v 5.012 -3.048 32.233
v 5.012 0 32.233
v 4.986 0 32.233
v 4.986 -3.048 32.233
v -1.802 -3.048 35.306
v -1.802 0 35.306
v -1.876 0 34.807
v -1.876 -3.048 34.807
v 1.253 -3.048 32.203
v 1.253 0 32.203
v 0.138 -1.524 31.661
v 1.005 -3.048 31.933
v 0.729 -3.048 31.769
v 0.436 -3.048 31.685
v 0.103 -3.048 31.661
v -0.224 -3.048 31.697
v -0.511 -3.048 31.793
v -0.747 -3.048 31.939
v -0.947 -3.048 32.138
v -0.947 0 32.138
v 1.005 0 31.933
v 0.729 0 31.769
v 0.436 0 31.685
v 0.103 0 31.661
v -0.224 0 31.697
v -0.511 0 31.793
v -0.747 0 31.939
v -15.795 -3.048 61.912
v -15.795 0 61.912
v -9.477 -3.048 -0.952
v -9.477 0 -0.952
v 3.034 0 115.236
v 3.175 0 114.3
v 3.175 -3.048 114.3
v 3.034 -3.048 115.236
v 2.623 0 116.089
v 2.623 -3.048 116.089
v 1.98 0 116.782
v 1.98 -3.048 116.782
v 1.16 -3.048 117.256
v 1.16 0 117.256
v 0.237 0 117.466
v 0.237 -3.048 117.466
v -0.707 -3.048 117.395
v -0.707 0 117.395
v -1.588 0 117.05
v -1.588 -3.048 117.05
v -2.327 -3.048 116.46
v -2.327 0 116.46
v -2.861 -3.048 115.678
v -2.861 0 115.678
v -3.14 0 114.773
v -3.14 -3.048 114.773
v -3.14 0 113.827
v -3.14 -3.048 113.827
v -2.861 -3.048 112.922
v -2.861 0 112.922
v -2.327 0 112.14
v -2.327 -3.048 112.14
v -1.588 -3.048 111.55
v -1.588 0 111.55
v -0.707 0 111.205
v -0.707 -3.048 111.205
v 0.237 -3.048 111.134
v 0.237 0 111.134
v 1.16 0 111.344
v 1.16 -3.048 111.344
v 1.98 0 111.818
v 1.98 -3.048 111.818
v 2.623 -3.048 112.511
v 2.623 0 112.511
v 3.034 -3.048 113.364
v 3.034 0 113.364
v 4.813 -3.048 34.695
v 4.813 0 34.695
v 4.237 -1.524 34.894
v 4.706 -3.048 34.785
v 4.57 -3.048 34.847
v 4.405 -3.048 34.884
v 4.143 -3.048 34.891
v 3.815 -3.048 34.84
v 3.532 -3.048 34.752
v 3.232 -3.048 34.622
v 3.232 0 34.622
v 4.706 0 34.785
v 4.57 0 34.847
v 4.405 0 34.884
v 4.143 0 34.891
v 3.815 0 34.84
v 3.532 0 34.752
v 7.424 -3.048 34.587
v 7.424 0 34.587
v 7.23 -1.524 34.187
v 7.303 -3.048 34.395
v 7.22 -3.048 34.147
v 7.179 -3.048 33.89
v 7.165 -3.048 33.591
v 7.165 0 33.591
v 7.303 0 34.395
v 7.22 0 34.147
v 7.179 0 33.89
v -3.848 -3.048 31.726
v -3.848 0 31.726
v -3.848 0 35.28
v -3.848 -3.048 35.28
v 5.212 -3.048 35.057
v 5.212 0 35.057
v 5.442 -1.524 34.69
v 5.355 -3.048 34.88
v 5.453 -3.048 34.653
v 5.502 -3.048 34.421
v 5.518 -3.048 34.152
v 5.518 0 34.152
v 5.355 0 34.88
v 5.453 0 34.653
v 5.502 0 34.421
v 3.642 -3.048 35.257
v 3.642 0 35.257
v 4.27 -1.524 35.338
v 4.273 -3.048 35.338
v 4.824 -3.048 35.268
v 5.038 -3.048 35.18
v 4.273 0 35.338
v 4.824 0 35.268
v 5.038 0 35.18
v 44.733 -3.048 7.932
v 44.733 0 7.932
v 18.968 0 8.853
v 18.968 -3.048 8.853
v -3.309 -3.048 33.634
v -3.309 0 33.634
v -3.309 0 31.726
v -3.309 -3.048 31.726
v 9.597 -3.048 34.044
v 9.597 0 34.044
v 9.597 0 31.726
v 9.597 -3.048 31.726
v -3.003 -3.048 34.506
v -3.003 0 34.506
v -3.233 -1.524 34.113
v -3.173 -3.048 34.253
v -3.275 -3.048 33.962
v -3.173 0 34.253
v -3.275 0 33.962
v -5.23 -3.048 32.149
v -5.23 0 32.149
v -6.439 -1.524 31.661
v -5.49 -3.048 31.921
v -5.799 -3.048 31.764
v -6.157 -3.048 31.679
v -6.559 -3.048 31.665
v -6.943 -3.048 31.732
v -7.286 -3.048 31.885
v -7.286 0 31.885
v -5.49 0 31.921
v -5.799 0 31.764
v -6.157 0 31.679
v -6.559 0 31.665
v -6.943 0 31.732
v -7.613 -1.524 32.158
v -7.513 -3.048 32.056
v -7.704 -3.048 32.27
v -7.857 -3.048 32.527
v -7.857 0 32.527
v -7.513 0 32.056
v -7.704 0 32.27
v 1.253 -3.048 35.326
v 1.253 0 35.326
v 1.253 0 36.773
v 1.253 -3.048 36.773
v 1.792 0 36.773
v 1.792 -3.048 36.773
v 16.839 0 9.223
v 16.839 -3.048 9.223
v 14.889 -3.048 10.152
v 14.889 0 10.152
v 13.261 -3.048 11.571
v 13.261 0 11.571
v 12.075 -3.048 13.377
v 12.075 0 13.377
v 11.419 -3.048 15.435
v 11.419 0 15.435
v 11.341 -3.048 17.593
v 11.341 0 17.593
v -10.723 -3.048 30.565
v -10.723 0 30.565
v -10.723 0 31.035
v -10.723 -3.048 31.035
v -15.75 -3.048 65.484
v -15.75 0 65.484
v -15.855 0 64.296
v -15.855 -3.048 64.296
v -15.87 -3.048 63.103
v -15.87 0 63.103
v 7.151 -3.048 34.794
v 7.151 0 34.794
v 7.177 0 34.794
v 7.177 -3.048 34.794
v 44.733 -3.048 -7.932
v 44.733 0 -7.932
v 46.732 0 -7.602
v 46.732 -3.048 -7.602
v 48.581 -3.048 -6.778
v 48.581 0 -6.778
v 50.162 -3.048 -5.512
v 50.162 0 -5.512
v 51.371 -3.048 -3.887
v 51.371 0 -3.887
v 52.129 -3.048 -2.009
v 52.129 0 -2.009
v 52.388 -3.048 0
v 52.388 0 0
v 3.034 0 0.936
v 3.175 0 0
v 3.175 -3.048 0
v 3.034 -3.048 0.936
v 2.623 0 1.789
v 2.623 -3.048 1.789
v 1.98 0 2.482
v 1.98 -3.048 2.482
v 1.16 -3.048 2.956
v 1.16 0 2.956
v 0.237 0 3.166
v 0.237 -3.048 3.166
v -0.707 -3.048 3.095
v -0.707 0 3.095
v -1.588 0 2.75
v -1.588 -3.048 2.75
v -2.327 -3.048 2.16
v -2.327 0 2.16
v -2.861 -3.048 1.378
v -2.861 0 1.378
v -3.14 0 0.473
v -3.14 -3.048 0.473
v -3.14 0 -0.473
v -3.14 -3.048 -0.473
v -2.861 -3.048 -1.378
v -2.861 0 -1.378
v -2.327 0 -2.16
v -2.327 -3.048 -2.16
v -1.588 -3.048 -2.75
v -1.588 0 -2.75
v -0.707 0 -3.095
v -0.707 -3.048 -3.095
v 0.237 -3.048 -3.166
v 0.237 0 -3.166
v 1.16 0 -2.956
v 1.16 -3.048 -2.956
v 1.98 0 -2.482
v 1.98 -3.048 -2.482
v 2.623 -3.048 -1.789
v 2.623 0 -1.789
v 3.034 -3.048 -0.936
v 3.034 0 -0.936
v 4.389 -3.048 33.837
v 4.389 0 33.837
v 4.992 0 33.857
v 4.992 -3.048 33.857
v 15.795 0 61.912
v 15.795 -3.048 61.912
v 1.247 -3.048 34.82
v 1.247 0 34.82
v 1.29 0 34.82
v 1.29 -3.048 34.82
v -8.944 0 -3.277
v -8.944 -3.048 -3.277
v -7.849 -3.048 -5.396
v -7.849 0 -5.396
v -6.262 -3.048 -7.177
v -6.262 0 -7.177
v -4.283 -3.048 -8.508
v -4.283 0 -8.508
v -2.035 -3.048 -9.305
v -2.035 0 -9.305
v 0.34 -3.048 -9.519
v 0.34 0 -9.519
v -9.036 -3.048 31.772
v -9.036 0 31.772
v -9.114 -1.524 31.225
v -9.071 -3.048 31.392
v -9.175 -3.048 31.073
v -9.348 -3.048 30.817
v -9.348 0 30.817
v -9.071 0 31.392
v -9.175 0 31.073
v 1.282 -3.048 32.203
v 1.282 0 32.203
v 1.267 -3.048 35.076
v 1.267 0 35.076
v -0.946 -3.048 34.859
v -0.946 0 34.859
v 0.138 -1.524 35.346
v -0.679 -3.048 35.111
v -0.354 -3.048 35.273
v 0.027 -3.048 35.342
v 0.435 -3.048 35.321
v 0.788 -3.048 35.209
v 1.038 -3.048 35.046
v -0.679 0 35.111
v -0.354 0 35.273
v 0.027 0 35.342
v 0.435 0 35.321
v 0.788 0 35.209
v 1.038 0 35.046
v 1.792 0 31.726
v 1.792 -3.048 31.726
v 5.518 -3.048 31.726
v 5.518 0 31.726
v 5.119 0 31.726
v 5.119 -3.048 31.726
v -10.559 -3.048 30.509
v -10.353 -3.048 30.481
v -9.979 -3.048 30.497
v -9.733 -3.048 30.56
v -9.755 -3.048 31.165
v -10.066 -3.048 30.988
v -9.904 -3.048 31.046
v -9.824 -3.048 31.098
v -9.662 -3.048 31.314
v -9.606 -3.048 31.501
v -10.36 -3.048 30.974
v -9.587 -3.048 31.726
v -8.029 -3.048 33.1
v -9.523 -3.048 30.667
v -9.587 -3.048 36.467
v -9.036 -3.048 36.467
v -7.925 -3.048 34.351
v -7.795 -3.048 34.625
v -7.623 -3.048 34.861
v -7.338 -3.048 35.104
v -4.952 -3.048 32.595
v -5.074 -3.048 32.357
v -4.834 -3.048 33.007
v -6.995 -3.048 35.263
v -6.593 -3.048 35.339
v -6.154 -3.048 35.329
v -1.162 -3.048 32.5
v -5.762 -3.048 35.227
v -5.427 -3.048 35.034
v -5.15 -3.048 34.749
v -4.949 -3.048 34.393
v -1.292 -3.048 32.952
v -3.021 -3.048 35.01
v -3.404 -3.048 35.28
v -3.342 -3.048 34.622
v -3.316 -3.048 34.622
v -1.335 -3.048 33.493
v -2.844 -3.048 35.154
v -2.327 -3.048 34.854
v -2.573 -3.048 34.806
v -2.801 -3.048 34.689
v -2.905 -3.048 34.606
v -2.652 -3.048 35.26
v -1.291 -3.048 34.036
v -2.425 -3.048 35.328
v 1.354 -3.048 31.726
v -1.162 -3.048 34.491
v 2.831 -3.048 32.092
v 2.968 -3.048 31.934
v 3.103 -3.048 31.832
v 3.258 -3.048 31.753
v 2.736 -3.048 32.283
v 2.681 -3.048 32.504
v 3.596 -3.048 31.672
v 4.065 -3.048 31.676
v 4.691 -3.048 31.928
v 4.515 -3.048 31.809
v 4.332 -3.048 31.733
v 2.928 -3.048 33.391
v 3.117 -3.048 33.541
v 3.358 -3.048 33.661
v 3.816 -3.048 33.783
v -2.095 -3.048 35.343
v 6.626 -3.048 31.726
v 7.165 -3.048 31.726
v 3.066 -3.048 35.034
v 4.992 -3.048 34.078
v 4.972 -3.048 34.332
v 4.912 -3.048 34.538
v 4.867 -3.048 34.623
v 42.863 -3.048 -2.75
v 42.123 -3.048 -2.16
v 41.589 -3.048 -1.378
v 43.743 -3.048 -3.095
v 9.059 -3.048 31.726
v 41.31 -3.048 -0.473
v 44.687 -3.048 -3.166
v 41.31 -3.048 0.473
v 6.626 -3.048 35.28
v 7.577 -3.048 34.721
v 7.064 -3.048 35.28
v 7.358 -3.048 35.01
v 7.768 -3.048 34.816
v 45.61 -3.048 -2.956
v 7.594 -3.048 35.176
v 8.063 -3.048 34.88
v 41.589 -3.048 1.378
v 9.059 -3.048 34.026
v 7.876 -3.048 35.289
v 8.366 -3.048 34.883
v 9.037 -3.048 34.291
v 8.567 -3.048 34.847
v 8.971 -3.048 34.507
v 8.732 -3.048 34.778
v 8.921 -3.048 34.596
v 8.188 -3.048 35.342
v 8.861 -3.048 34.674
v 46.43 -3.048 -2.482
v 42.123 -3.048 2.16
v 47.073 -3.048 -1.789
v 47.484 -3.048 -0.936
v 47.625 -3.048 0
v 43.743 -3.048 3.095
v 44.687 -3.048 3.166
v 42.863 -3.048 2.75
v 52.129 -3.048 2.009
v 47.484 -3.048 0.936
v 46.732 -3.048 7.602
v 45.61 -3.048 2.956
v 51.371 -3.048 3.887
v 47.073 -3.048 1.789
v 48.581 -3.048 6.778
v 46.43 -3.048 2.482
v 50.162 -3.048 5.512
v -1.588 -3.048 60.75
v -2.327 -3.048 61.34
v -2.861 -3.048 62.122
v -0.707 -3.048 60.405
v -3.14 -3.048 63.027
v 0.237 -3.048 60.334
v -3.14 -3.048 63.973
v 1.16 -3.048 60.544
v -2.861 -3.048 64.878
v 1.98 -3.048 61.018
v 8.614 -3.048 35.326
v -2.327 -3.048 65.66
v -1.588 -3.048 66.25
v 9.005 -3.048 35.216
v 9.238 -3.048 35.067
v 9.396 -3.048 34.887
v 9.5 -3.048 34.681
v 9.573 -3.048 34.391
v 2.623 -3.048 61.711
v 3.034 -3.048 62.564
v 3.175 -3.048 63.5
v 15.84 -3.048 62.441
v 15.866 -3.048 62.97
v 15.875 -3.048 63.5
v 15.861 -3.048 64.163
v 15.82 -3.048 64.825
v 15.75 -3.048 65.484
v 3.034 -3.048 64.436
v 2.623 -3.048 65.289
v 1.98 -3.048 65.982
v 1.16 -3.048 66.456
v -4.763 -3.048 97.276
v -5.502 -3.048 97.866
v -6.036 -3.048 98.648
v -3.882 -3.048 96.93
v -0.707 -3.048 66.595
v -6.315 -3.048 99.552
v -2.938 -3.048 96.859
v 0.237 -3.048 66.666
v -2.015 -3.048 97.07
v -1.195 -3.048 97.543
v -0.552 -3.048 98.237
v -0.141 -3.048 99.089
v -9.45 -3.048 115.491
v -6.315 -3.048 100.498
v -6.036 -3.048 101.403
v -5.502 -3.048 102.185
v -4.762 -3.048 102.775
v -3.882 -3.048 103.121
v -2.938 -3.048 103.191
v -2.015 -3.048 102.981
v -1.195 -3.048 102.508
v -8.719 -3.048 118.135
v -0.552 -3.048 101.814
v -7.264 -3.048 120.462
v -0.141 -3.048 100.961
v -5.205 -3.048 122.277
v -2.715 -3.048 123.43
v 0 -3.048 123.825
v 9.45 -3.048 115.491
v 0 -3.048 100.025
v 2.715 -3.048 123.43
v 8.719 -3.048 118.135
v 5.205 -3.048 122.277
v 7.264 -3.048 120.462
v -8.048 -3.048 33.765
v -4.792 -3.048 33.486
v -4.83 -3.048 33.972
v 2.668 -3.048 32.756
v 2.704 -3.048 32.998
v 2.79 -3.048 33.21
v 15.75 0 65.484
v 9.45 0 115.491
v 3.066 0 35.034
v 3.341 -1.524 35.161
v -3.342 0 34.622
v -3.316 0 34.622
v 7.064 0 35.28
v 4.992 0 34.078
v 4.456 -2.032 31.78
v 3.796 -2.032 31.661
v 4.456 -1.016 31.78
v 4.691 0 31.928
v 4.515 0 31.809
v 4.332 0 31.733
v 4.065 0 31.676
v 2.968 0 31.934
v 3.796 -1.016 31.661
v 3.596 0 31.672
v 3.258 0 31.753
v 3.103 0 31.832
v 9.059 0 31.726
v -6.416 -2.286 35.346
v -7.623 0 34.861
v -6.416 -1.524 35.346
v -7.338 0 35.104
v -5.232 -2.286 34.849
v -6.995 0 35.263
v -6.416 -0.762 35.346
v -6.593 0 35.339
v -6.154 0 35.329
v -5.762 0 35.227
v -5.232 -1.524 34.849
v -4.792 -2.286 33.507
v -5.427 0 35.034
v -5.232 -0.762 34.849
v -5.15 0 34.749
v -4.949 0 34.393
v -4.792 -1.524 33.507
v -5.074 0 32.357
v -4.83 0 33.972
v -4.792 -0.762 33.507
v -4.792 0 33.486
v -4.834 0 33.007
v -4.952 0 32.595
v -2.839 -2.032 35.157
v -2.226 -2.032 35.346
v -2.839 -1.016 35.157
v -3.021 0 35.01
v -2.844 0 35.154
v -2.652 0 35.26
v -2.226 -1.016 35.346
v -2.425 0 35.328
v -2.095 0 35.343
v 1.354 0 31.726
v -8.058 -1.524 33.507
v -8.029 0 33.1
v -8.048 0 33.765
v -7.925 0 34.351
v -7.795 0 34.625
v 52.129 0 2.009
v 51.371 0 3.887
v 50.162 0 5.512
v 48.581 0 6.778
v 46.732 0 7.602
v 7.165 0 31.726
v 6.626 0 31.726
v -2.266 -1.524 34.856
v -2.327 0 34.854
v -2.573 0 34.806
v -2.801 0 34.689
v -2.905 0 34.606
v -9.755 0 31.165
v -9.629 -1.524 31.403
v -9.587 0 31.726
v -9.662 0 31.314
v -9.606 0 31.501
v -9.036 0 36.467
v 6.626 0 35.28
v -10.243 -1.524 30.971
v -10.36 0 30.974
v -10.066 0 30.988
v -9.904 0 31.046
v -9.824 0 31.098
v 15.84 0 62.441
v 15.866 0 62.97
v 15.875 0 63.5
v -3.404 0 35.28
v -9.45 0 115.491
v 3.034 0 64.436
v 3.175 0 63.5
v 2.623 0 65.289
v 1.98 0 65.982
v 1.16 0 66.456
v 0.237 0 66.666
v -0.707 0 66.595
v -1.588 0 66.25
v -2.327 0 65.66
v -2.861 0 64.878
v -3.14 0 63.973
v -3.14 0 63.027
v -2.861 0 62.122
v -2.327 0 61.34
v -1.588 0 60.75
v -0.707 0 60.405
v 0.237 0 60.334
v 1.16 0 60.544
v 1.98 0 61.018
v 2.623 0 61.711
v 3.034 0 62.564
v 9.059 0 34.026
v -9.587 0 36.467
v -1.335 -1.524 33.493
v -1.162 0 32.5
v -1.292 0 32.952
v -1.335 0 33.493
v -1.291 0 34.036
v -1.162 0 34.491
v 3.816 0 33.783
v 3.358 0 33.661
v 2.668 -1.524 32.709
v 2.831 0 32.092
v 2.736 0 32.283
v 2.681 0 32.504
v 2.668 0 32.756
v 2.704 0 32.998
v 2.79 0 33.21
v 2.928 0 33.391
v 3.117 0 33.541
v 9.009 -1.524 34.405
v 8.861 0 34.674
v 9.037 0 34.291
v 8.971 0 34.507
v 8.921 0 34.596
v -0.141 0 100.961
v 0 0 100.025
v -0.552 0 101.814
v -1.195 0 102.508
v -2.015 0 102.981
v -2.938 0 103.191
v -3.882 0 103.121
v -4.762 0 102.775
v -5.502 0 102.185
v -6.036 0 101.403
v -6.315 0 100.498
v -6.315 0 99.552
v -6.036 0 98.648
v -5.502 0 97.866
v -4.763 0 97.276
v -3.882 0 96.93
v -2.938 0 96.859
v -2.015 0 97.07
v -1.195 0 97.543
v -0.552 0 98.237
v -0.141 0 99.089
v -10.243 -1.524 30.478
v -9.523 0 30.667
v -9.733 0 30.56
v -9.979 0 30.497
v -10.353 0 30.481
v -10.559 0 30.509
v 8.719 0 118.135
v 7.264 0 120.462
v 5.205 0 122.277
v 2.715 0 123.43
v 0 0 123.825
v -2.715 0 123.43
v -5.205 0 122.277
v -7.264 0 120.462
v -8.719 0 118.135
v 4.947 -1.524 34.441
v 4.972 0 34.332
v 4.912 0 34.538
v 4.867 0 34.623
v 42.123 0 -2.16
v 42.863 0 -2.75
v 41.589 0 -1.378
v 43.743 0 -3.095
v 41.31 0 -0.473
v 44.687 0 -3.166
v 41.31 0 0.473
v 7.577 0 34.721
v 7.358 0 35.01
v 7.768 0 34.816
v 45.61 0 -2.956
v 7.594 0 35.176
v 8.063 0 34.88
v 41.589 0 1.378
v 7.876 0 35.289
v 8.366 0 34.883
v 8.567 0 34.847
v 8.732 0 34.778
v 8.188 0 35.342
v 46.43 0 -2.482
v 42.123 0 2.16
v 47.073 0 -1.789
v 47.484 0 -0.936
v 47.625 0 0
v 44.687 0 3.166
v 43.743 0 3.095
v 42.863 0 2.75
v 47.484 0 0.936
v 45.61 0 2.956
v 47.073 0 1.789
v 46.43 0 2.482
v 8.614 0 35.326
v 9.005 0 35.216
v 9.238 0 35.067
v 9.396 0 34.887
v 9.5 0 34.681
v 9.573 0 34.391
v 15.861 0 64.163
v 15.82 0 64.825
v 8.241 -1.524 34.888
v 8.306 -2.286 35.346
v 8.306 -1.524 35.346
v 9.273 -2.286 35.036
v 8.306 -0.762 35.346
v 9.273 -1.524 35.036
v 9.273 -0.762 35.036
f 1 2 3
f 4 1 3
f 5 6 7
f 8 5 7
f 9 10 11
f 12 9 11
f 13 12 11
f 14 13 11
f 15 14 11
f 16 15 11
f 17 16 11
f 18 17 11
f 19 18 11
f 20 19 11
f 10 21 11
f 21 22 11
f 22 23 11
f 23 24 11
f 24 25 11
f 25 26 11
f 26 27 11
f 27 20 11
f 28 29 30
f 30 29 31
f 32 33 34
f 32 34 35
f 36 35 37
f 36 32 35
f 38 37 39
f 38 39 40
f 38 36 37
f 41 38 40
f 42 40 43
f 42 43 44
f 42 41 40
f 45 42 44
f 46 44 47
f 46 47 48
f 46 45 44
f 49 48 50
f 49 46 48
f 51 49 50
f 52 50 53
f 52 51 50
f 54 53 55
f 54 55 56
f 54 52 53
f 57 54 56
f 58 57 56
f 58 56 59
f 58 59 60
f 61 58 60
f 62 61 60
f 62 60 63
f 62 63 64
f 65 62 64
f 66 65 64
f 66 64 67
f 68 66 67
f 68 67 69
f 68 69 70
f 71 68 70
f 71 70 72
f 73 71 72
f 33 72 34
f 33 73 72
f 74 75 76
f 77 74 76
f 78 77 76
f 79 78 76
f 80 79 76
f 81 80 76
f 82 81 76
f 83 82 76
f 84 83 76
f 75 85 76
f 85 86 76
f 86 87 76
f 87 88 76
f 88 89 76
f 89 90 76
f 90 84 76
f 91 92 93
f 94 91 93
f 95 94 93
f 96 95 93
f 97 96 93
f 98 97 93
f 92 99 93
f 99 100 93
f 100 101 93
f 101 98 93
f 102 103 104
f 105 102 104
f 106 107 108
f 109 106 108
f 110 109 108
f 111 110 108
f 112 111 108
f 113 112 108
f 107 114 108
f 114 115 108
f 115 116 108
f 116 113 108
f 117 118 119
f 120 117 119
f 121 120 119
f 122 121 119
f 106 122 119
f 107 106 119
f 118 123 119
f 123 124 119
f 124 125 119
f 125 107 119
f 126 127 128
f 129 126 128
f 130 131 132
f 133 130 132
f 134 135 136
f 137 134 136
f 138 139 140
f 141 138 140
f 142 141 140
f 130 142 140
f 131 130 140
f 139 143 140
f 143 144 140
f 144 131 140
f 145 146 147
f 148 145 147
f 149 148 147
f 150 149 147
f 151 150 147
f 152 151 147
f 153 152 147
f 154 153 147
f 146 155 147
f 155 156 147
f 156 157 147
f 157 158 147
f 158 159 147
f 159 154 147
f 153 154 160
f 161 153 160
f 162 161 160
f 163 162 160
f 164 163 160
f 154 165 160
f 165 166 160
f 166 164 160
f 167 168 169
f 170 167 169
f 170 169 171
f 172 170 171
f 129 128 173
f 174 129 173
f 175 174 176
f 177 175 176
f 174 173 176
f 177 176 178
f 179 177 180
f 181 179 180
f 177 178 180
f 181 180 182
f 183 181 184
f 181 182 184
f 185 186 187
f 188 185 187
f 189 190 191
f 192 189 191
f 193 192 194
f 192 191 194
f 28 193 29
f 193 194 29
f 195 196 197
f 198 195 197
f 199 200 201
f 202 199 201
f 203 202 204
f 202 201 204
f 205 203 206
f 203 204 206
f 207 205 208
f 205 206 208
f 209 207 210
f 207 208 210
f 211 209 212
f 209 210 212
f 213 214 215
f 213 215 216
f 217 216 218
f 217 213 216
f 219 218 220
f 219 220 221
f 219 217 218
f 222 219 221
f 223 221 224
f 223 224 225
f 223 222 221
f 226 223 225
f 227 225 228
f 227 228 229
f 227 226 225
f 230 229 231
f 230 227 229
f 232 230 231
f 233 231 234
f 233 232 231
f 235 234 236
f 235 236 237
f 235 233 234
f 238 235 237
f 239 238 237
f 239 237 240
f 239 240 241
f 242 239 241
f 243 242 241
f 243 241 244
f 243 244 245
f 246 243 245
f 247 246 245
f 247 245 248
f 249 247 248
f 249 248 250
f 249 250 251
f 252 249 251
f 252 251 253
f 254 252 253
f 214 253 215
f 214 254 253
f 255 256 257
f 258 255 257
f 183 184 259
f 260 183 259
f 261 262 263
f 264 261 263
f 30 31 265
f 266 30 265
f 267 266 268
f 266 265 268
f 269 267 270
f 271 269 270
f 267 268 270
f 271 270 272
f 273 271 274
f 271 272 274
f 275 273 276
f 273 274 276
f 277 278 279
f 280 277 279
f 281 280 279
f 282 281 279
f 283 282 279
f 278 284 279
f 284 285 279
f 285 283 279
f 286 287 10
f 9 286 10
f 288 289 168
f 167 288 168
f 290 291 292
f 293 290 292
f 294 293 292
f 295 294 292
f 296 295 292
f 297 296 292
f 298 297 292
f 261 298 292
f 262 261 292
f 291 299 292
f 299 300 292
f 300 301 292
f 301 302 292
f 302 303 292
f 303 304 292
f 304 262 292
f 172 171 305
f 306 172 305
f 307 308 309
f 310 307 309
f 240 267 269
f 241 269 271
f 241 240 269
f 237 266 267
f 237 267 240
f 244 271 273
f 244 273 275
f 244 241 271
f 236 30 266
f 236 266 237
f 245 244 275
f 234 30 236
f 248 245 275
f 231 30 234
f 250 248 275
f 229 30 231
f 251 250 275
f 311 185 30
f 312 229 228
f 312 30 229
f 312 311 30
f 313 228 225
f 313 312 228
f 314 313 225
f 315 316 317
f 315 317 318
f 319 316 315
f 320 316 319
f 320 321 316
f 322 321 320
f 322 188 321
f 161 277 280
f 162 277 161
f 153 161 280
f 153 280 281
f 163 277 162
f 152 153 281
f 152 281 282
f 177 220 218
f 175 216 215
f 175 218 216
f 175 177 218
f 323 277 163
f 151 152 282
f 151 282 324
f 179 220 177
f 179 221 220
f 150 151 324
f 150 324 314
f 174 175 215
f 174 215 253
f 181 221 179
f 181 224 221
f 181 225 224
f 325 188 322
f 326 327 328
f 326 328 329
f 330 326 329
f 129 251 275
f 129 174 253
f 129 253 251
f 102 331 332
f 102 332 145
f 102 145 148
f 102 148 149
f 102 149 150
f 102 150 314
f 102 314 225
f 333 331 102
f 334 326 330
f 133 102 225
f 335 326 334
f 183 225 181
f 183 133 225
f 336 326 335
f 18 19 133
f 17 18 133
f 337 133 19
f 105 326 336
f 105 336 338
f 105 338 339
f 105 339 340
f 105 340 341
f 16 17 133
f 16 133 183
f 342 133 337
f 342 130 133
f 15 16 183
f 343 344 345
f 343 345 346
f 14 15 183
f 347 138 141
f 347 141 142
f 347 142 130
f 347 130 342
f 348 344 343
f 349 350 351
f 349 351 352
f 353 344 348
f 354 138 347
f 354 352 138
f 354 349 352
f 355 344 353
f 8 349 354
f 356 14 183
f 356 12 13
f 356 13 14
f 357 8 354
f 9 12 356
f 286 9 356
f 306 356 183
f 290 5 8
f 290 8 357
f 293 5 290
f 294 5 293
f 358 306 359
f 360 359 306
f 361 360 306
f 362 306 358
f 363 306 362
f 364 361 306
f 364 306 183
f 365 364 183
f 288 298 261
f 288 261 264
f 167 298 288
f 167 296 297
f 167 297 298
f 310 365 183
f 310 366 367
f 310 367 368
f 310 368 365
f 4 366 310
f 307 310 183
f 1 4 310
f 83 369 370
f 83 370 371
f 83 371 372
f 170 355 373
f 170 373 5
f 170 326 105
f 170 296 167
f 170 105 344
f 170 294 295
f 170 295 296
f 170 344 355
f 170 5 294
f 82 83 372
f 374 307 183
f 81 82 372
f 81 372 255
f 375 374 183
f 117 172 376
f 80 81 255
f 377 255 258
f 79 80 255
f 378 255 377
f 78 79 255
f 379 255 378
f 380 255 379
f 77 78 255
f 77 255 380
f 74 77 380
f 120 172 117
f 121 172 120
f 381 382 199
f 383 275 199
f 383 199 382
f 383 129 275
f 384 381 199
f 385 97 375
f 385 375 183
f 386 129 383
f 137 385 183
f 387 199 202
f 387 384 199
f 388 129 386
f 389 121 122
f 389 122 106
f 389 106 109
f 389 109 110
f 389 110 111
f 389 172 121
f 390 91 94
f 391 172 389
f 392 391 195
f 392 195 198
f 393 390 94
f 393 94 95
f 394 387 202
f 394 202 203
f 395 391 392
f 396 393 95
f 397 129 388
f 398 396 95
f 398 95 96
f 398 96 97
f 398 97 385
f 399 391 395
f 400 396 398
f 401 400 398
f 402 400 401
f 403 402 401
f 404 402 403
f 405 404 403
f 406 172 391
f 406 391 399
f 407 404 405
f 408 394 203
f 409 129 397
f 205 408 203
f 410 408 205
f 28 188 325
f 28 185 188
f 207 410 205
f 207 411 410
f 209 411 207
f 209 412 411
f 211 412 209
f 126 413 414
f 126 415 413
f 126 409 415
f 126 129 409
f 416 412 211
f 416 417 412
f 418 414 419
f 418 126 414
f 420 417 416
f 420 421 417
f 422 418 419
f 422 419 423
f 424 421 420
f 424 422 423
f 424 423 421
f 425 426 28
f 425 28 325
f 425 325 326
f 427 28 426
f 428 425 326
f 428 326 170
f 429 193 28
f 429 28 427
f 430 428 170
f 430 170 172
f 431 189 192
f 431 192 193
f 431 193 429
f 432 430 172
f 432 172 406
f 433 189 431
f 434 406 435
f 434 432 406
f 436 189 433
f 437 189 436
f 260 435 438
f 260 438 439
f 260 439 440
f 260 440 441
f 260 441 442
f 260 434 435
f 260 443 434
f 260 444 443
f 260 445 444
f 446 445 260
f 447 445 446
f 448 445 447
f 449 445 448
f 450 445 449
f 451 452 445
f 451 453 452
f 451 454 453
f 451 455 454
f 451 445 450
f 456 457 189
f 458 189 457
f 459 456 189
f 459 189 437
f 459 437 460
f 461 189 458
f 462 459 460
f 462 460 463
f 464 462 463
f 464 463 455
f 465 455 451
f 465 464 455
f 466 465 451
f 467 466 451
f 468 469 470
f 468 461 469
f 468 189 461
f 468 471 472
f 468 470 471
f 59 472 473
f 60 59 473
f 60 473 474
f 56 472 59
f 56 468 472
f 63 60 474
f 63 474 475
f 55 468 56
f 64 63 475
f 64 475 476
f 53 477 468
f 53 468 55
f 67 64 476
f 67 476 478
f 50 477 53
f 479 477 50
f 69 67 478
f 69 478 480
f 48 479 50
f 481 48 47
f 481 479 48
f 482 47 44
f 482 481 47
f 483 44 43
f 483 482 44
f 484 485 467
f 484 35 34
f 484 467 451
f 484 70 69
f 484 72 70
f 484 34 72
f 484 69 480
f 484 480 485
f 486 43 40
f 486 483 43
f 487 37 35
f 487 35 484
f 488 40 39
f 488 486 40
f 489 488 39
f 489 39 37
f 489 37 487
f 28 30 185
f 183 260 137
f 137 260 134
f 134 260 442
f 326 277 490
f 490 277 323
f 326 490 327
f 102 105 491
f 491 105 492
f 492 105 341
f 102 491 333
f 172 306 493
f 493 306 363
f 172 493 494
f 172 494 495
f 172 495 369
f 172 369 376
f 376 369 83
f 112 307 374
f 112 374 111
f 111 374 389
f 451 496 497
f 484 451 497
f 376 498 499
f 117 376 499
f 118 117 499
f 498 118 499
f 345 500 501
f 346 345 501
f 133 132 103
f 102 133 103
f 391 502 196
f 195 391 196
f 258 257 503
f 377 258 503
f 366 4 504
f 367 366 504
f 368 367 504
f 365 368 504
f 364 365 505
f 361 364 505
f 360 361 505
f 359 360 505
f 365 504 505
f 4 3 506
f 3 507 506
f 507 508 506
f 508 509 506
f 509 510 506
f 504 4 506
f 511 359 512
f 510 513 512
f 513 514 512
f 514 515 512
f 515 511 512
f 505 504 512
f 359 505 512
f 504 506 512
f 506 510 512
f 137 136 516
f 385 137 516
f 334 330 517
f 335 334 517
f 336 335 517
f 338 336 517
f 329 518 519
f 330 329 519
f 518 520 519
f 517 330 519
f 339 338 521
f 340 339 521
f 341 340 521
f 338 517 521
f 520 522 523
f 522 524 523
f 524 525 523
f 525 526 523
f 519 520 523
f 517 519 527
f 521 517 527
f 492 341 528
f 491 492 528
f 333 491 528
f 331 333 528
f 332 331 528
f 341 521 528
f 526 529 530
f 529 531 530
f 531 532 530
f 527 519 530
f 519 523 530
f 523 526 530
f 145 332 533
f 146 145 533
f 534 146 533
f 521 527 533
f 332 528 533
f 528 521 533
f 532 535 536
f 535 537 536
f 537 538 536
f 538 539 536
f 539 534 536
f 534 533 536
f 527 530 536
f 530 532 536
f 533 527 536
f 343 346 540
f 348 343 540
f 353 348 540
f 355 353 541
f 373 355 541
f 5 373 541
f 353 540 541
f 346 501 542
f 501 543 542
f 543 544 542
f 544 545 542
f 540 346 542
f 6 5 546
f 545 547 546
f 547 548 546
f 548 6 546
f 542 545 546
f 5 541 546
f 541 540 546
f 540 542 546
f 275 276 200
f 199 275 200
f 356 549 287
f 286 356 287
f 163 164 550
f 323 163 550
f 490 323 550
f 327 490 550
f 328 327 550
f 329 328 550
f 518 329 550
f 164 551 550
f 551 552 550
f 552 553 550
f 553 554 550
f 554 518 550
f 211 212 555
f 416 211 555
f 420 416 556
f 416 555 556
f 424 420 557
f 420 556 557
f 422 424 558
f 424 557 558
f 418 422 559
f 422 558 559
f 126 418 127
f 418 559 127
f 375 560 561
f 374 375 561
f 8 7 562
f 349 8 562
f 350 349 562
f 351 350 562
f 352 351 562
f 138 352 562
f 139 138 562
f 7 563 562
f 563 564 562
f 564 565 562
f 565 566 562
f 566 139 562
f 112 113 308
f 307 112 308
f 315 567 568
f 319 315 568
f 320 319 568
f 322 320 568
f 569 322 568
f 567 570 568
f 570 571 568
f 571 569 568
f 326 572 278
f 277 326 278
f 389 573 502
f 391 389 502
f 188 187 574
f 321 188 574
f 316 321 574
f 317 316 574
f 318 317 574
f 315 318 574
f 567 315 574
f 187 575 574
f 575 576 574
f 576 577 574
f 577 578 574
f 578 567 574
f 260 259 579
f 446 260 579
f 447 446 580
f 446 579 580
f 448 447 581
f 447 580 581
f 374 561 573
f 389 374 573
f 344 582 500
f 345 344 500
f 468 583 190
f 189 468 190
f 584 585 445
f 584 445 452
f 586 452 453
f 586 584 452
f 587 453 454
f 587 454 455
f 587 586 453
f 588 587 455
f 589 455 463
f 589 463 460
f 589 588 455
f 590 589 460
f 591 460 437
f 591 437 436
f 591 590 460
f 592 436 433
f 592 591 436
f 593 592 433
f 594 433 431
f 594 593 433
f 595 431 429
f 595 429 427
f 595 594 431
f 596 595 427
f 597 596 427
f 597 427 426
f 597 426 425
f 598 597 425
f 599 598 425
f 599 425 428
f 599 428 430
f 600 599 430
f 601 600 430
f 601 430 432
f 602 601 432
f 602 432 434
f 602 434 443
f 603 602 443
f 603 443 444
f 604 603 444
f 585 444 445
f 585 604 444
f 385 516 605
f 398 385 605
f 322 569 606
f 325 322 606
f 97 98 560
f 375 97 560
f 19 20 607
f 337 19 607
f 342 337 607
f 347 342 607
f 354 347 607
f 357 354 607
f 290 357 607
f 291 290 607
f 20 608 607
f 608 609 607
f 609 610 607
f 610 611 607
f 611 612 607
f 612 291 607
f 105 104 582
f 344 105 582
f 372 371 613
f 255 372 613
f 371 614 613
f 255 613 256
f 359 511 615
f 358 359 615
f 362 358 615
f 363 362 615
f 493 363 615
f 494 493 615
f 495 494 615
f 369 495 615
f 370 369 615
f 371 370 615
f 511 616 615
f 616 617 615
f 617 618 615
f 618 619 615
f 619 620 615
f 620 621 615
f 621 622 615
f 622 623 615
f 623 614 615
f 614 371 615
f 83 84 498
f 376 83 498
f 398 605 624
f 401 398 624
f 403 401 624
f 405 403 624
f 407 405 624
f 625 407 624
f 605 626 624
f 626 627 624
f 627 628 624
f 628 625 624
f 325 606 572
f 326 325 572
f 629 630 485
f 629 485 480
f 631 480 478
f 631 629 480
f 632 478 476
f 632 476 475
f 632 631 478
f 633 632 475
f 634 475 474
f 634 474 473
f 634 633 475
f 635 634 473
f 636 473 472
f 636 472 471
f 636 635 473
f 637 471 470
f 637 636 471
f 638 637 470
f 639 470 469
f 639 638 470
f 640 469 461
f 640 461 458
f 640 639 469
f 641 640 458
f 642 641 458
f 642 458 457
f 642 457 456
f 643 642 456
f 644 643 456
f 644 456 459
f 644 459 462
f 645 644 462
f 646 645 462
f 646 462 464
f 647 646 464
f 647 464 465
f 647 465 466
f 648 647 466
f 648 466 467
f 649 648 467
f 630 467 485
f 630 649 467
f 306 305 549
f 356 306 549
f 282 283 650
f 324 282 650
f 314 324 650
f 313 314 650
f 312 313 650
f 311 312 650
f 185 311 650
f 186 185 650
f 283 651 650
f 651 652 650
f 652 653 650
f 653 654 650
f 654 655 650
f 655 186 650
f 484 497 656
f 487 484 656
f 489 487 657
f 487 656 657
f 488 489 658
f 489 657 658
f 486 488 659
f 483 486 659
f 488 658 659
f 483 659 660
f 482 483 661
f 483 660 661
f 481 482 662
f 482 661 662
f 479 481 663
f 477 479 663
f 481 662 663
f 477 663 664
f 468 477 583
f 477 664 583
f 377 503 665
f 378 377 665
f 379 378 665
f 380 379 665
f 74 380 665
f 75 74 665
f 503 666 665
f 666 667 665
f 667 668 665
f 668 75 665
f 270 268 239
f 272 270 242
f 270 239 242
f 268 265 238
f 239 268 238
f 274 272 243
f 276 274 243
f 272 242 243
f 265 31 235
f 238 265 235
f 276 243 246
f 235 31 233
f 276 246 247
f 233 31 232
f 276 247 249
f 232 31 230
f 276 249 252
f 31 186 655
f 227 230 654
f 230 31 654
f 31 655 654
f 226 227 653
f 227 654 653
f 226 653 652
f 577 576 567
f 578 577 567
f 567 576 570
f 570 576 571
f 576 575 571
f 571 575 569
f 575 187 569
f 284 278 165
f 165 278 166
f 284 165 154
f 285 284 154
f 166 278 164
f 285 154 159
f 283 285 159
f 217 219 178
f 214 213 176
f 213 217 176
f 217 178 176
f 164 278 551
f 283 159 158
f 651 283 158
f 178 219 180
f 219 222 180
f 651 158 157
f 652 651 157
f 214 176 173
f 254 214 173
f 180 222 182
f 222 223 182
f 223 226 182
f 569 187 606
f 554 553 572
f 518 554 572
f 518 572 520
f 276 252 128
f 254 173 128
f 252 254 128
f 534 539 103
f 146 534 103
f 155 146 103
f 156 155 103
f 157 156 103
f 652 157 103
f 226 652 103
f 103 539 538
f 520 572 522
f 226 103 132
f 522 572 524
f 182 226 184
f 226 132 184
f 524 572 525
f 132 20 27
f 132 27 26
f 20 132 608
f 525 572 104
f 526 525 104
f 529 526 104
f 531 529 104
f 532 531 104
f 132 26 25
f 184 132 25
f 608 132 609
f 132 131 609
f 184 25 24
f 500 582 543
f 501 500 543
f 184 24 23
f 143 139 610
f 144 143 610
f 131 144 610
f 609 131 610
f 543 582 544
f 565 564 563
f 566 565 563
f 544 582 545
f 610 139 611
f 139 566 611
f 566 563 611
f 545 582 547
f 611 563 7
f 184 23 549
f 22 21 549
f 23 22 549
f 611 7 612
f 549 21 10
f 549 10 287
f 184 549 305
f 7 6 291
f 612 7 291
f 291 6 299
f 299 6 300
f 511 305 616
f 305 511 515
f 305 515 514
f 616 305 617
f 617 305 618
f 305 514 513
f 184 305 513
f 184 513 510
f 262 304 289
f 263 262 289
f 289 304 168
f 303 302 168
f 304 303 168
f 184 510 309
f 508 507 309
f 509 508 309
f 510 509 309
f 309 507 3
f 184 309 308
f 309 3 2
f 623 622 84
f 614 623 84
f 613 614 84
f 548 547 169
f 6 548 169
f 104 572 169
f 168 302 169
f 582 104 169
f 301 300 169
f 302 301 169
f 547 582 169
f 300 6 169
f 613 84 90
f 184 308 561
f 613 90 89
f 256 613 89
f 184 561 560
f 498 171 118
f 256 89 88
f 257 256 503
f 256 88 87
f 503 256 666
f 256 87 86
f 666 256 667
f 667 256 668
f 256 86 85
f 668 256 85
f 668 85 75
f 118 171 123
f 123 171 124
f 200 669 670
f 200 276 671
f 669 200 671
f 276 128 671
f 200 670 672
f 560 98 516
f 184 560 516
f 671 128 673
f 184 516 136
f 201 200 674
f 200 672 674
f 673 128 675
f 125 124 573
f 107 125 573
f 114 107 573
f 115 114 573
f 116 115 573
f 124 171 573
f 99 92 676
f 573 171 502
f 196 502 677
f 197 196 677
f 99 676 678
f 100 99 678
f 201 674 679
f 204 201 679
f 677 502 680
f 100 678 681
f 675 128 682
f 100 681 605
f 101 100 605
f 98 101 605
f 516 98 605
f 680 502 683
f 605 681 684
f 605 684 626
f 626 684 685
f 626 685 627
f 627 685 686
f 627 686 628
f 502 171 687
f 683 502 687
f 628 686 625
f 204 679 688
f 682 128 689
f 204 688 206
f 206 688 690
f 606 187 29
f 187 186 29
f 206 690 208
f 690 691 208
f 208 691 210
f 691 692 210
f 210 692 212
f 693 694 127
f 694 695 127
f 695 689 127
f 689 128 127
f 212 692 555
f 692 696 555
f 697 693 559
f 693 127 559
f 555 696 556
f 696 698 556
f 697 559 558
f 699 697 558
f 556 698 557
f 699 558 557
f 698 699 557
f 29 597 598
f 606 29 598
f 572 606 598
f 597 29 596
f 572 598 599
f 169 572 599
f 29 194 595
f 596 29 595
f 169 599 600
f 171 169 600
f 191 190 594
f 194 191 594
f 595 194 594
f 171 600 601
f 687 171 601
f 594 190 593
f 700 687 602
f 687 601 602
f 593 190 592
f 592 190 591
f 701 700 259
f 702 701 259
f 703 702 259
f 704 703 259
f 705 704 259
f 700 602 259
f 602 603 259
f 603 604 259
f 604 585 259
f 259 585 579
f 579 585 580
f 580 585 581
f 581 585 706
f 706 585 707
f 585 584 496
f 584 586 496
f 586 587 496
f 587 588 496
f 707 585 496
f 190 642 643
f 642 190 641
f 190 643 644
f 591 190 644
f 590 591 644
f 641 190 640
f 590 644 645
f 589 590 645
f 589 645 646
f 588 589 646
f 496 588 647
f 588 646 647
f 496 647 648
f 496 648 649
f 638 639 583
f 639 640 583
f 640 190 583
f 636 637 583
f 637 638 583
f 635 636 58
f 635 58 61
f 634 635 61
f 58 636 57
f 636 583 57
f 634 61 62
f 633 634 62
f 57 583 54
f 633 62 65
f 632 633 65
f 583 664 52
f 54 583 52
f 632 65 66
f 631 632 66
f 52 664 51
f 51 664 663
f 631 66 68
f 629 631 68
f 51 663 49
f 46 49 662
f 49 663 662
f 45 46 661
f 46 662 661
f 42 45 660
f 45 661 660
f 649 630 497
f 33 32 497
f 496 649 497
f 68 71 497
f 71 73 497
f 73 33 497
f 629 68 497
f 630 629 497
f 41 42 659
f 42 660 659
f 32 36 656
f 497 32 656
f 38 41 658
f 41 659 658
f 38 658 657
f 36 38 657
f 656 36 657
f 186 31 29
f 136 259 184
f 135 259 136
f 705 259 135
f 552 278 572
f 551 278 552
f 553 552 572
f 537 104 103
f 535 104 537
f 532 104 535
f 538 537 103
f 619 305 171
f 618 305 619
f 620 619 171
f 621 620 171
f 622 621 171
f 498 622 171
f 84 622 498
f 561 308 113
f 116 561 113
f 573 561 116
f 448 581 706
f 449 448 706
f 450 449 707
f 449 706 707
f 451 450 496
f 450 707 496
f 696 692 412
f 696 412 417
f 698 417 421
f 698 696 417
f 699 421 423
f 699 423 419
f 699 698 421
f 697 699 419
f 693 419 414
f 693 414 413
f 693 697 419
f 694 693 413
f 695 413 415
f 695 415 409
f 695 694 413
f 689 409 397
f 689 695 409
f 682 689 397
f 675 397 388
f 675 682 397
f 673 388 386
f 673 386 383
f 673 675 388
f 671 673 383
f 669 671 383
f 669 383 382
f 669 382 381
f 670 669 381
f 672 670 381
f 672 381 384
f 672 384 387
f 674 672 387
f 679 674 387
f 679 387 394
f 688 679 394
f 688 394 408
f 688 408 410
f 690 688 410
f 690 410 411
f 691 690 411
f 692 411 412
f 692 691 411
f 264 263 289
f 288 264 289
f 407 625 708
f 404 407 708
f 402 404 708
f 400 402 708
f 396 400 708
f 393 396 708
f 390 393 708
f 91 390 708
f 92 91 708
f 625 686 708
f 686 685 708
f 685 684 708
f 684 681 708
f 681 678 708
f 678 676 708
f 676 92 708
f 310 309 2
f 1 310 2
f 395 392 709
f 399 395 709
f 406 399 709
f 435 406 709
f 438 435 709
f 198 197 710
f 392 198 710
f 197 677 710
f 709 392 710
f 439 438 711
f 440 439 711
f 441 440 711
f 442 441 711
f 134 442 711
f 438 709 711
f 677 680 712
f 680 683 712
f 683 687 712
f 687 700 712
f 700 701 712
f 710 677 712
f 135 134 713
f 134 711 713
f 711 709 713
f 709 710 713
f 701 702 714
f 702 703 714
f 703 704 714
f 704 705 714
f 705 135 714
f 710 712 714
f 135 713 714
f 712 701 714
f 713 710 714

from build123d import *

# Parameters (mm, degrees)
F0_R     = 3.175
F1_DEPTH = 3.048


with BuildPart() as f1:
    # F0 (on Front) → F1 (new body)
    with BuildSketch(Plane.XZ):
        with BuildLine():
            ThreePointArc((-9.4502929642, 115.490625), (-0.596483242, 104.7936951058), (9.525, 114.3))
            ThreePointArc((9.525, 114.3), (9.5063048942, 114.896483242), (9.4502929642, 115.490625))
            ThreePointArc((9.4502929642, 115.490625), (0, 123.825), (-9.4502929642, 115.490625))
        make_face()
        with Locations((0, 114.3)):
            Circle(F0_R, mode=Mode.SUBTRACT)
        with BuildLine():
            ThreePointArc((9.4502929642, 115.490625), (9.5063048942, 114.896483242), (9.525, 114.3))
            ThreePointArc((9.525, 114.3), (-0.596483242, 104.7936951058), (-9.4502929642, 115.490625))
            Line((-9.4502929642, 115.490625), (-15.7504882737, 65.484375))
            ThreePointArc((-15.7504882737, 65.484375), (0, 79.375), (15.7504882737, 65.484375))
            Line((15.7504882737, 65.484375), (9.4502929642, 115.490625))
        make_face()
        with Locations((-3.175, 100.0252)):
            Circle(F0_R, mode=Mode.SUBTRACT)
        with BuildLine():
            ThreePointArc((15.875, 63.5), (15.8438414904, 64.4941387366), (15.7504882737, 65.484375))
            ThreePointArc((15.7504882737, 65.484375), (0, 79.375), (-15.7504882737, 65.484375))
            ThreePointArc((-15.7504882737, 65.484375), (-15.8737438155, 63.6997054867), (-15.7954255641, 61.9125))
            ThreePointArc((-15.7954255641, 61.9125), (0, 47.625), (15.7954255641, 61.9125))
            ThreePointArc((15.7954255641, 61.9125), (15.8550939106, 62.7052534459), (15.875, 63.5))
        make_face()
        with Locations((0, 63.5)):
            Circle(F0_R, mode=Mode.SUBTRACT)
        with BuildLine():
            ThreePointArc((15.7954255641, 61.9125), (0, 47.625), (-15.7954255641, 61.9125))
            Line((-15.7954255641, 61.9125), (-9.4772553384, -0.9525))
            ThreePointArc((-9.4772553384, -0.9525), (-0.4768479324, 9.5130563464), (9.525, 0))
            ThreePointArc((9.525, 0), (6.8544082857, -6.6138273378), (0.3401785714, -9.5189234444))
            Line((0.3401785714, -9.5189234444), (44.7334821429, -7.9324362036))
            ThreePointArc((44.7334821429, -7.9324362036), (36.5125, 0), (44.7334821429, 7.9324362036))
            Line((44.7334821429, 7.9324362036), (18.9676000005, 8.8532337108))
            ThreePointArc((18.9676000005, 8.8532337108), (13.2611998974, 11.5713591498), (11.3411865923, 17.5933818124))
            Line((11.3411865923, 17.5933818124), (15.7954255641, 61.9125))
        make_face()
        with BuildLine():
            add(Edge.make_bspline(
                [(-9.3477505007, 30.8167139411), (-9.6590568024, 30.4779089161), (-10.2432749619, 30.4779089161)],
                knots=[0, 0, 0, 1, 1, 1], degree=2))
            add(Edge.make_bspline(
                [(-10.2432749619, 30.4779089161), (-10.5473174499, 30.4779089161), (-10.7226866666, 30.5650746806)],
                knots=[0, 0, 0, 1, 1, 1], degree=2))
            Line((-10.7226866666, 30.5650746806), (-10.7226866666, 31.0351471962))
            add(Edge.make_bspline(
                [(-10.7226866666, 31.0351471962), (-10.4923200033, 30.9708105605), (-10.2432749619, 30.9708105605)],
                knots=[0, 0, 0, 1, 1, 1], degree=2))
            add(Edge.make_bspline(
                [(-10.2432749619, 30.9708105605), (-9.9215917835, 30.9708105605), (-9.7545240682, 31.165376999)],
                knots=[0, 0, 0, 1, 1, 1], degree=2))
            add(Edge.make_bspline(
                [(-9.7545240682, 31.165376999), (-9.587456353, 31.3599434376), (-9.587456353, 31.726247186)],
                knots=[0, 0, 0, 1, 1, 1], degree=2))
            Line((-9.587456353, 31.726247186), (-9.587456353, 36.4674421609))
            Line((-9.587456353, 36.4674421609), (-9.036444199, 36.4674421609))
            Line((-9.036444199, 36.4674421609), (-9.036444199, 31.7719054435))
            add(Edge.make_bspline(
                [(-9.036444199, 31.7719054435), (-9.036444199, 31.1555189662), (-9.3477505007, 30.8167139411)],
                knots=[0, 0, 0, 1, 1, 1], degree=2))
        make_face(mode=Mode.SUBTRACT)
        with BuildLine():
            add(Edge.make_bspline(
                [(-5.2317623483, 34.8491682359), (-4.7923016191, 34.3526346847), (-4.7923016191, 33.5069192317)],
                knots=[0, 0, 0, 1, 1, 1], degree=2))
            add(Edge.make_bspline(
                [(-4.7923016191, 33.5069192317), (-4.7923016191, 32.6373369623), (-5.229686973, 32.1491049124)],
                knots=[0, 0, 0, 1, 1, 1], degree=2))
            add(Edge.make_bspline(
                [(-5.229686973, 32.1491049124), (-5.6670723269, 31.6608728626), (-6.4391119551, 31.6608728626)],
                knots=[0, 0, 0, 1, 1, 1], degree=2))
            add(Edge.make_bspline(
                [(-6.4391119551, 31.6608728626), (-6.9164482844, 31.6608728626), (-7.2858650957, 31.8850133998)],
                knots=[0, 0, 0, 1, 1, 1], degree=2))
            add(Edge.make_bspline(
                [(-7.2858650957, 31.8850133998), (-7.6552819071, 32.1091539371), (-7.8565933155, 32.527342069)],
                knots=[0, 0, 0, 1, 1, 1], degree=2))
            add(Edge.make_bspline(
                [(-7.8565933155, 32.527342069), (-8.057904724, 32.945530201), (-8.057904724, 33.5069192317)],
                knots=[0, 0, 0, 1, 1, 1], degree=2))
            add(Edge.make_bspline(
                [(-8.057904724, 33.5069192317), (-8.057904724, 34.3754638135), (-7.6231135892, 34.8605828003)],
                knots=[0, 0, 0, 1, 1, 1], degree=2))
            add(Edge.make_bspline(
                [(-7.6231135892, 34.8605828003), (-7.1883224545, 35.3457017871), (-6.4162828263, 35.3457017871)],
                knots=[0, 0, 0, 1, 1, 1], degree=2))
            add(Edge.make_bspline(
                [(-6.4162828263, 35.3457017871), (-5.6712230775, 35.3457017871), (-5.2317623483, 34.8491682359)],
                knots=[0, 0, 0, 1, 1, 1], degree=2))
        make_face(mode=Mode.SUBTRACT)
        with BuildLine():
            add(Edge.make_bspline(
                [(-2.8393734197, 35.1573614746), (-2.5602354358, 35.3457017871), (-2.2261000053, 35.3457017871)],
                knots=[0, 0, 0, 1, 1, 1], degree=2))
            add(Edge.make_bspline(
                [(-2.2261000053, 35.3457017871), (-1.989507216, 35.3457017871), (-1.8016857473, 35.3062696556)],
                knots=[0, 0, 0, 1, 1, 1], degree=2))
            Line((-1.8016857473, 35.3062696556), (-1.8763992598, 34.8071418852))
            add(Edge.make_bspline(
                [(-1.8763992598, 34.8071418852), (-2.0963890463, 34.8559132058), (-2.2655321369, 34.8559132058)],
                knots=[0, 0, 0, 1, 1, 1], degree=2))
            add(Edge.make_bspline(
                [(-2.2655321369, 34.8559132058), (-2.6972102086, 34.8559132058), (-3.0033280719, 34.5056936163)],
                knots=[0, 0, 0, 1, 1, 1], degree=2))
            add(Edge.make_bspline(
                [(-3.0033280719, 34.5056936163), (-3.3094459353, 34.1554740269), (-3.3094459353, 33.6335171277)],
                knots=[0, 0, 0, 1, 1, 1], degree=2))
            Line((-3.3094459353, 33.6335171277), (-3.3094459353, 31.726247186))
            Line((-3.3094459353, 31.726247186), (-3.8480058372, 31.726247186))
            Line((-3.8480058372, 31.726247186), (-3.8480058372, 35.2803274638))
            Line((-3.8480058372, 35.2803274638), (-3.4038755135, 35.2803274638))
            Line((-3.4038755135, 35.2803274638), (-3.3416142531, 34.6224334795))
            Line((-3.3416142531, 34.6224334795), (-3.3156720613, 34.6224334795))
            add(Edge.make_bspline(
                [(-3.3156720613, 34.6224334795), (-3.1185114036, 34.9690211621), (-2.8393734197, 35.1573614746)],
                knots=[0, 0, 0, 1, 1, 1], degree=2))
        make_face(mode=Mode.SUBTRACT)
        with BuildLine():
            Line((1.3539224643, 31.726247186), (1.2823220149, 32.2025458276))
            Line((1.2823220149, 32.2025458276), (1.2532667601, 32.2025458276))
            add(Edge.make_bspline(
                [(1.2532667601, 32.2025458276), (0.8807368857, 31.6608728626), (0.1377525123, 31.6608728626)],
                knots=[0, 0, 0, 1, 1, 1], degree=2))
            add(Edge.make_bspline(
                [(0.1377525123, 31.6608728626), (-0.5595736035, 31.6608728626), (-0.9471499492, 32.137690348)],
                knots=[0, 0, 0, 1, 1, 1], degree=2))
            add(Edge.make_bspline(
                [(-0.9471499492, 32.137690348), (-1.3347262948, 32.6145078335), (-1.3347262948, 33.493429292)],
                knots=[0, 0, 0, 1, 1, 1], degree=2))
            add(Edge.make_bspline(
                [(-1.3347262948, 33.493429292), (-1.3347262948, 34.3723507505), (-0.9455934177, 34.8590262688)],
                knots=[0, 0, 0, 1, 1, 1], degree=2))
            add(Edge.make_bspline(
                [(-0.9455934177, 34.8590262688), (-0.5564605405, 35.3457017871), (0.1377525123, 35.3457017871)],
                knots=[0, 0, 0, 1, 1, 1], degree=2))
            add(Edge.make_bspline(
                [(0.1377525123, 35.3457017871), (0.8610208199, 35.3457017871), (1.247040634, 34.8195941372)],
                knots=[0, 0, 0, 1, 1, 1], degree=2))
            Line((1.247040634, 34.8195941372), (1.2895858286, 34.8195941372))
            Line((1.2895858286, 34.8195941372), (1.2667566998, 35.0759029923))
            Line((1.2667566998, 35.0759029923), (1.2532667601, 35.3259857213))
            Line((1.2532667601, 35.3259857213), (1.2532667601, 36.7725223366))
            Line((1.2532667601, 36.7725223366), (1.791826662, 36.7725223366))
            Line((1.791826662, 36.7725223366), (1.791826662, 31.726247186))
            Line((1.791826662, 31.726247186), (1.3539224643, 31.726247186))
        make_face(mode=Mode.SUBTRACT)
        with BuildLine():
            Line((5.5181630934, 31.726247186), (5.1186533396, 31.726247186))
            Line((5.1186533396, 31.726247186), (5.0117715093, 32.2326387701))
            Line((5.0117715093, 32.2326387701), (4.9858293175, 32.2326387701))
            add(Edge.make_bspline(
                [(4.9858293175, 32.2326387701), (4.7201812734, 31.8985033396), (4.4560897608, 31.7796881011)],
                knots=[0, 0, 0, 1, 1, 1], degree=2))
            add(Edge.make_bspline(
                [(4.4560897608, 31.7796881011), (4.1919982482, 31.6608728626), (3.7956015573, 31.6608728626)],
                knots=[0, 0, 0, 1, 1, 1], degree=2))
            add(Edge.make_bspline(
                [(3.7956015573, 31.6608728626), (3.2674185321, 31.6608728626), (2.9675267948, 31.9337847204)],
                knots=[0, 0, 0, 1, 1, 1], degree=2))
            add(Edge.make_bspline(
                [(2.9675267948, 31.9337847204), (2.6676350575, 32.2066965783), (2.6676350575, 32.7089374117)],
                knots=[0, 0, 0, 1, 1, 1], degree=2))
            add(Edge.make_bspline(
                [(2.6676350575, 32.7089374117), (2.6676350575, 33.7850195279), (4.3891589059, 33.8369039115)],
                knots=[0, 0, 0, 1, 1, 1], degree=2))
            Line((4.3891589059, 33.8369039115), (4.9920554435, 33.8566199773))
            Line((4.9920554435, 33.8566199773), (4.9920554435, 34.0776474515))
            add(Edge.make_bspline(
                [(4.9920554435, 34.0776474515), (4.9920554435, 34.4958355835), (4.8125354762, 34.6950716166)],
                knots=[0, 0, 0, 1, 1, 1], degree=2))
            add(Edge.make_bspline(
                [(4.8125354762, 34.6950716166), (4.6330155089, 34.8943076496), (4.2366188181, 34.8943076496)],
                knots=[0, 0, 0, 1, 1, 1], degree=2))
            add(Edge.make_bspline(
                [(4.2366188181, 34.8943076496), (3.7924884943, 34.8943076496), (3.2321371512, 34.6224334795)],
                knots=[0, 0, 0, 1, 1, 1], degree=2))
            Line((3.2321371512, 34.6224334795), (3.0661071237, 35.0343954854))
            add(Edge.make_bspline(
                [(3.0661071237, 35.0343954854), (3.3286421048, 35.1765586965), (3.641504938, 35.257498335)],
                knots=[0, 0, 0, 1, 1, 1], degree=2))
            add(Edge.make_bspline(
                [(3.641504938, 35.257498335), (3.9543677712, 35.3384379734), (4.2698248236, 35.3384379734)],
                knots=[0, 0, 0, 1, 1, 1], degree=2))
            add(Edge.make_bspline(
                [(4.2698248236, 35.3384379734), (4.9048896791, 35.3384379734), (5.2115263862, 35.0567057704)],
                knots=[0, 0, 0, 1, 1, 1], degree=2))
            add(Edge.make_bspline(
                [(5.2115263862, 35.0567057704), (5.5181630934, 34.7749735673), (5.5181630934, 34.1523609639)],
                knots=[0, 0, 0, 1, 1, 1], degree=2))
            Line((5.5181630934, 34.1523609639), (5.5181630934, 31.726247186))
        make_face(mode=Mode.SUBTRACT)
        with BuildLine():
            Line((9.5973133334, 31.726247186), (9.0587534315, 31.726247186))
            Line((9.0587534315, 31.726247186), (9.0587534315, 34.0257630679))
            add(Edge.make_bspline(
                [(9.0587534315, 34.0257630679), (9.0587534315, 34.4595165149), (8.8610739299, 34.6737990193)],
                knots=[0, 0, 0, 1, 1, 1], degree=2))
            add(Edge.make_bspline(
                [(8.8610739299, 34.6737990193), (8.6633944283, 34.8880815236), (8.2410555457, 34.8880815236)],
                knots=[0, 0, 0, 1, 1, 1], degree=2))
            add(Edge.make_bspline(
                [(8.2410555457, 34.8880815236), (7.6838172656, 34.8880815236), (7.4243953475, 34.5866332548)],
                knots=[0, 0, 0, 1, 1, 1], degree=2))
            add(Edge.make_bspline(
                [(7.4243953475, 34.5866332548), (7.1649734295, 34.285184986), (7.1649734295, 33.5909719332)],
                knots=[0, 0, 0, 1, 1, 1], degree=2))
            Line((7.1649734295, 33.5909719332), (7.1649734295, 31.726247186))
            Line((7.1649734295, 31.726247186), (6.6264135275, 31.726247186))
            Line((6.6264135275, 31.726247186), (6.6264135275, 35.2803274638))
            Line((6.6264135275, 35.2803274638), (7.0643177252, 35.2803274638))
            Line((7.0643177252, 35.2803274638), (7.1514834897, 34.7936519454))
            Line((7.1514834897, 34.7936519454), (7.1774256815, 34.7936519454))
            add(Edge.make_bspline(
                [(7.1774256815, 34.7936519454), (7.3434557091, 35.0561869265), (7.6417909149, 35.2009443568)],
                knots=[0, 0, 0, 1, 1, 1], degree=2))
            add(Edge.make_bspline(
                [(7.6417909149, 35.2009443568), (7.9401261207, 35.3457017871), (8.306429869, 35.3457017871)],
                knots=[0, 0, 0, 1, 1, 1], degree=2))
            add(Edge.make_bspline(
                [(8.306429869, 35.3457017871), (8.9487585382, 35.3457017871), (9.2730359358, 35.0359520169)],
                knots=[0, 0, 0, 1, 1, 1], degree=2))
            add(Edge.make_bspline(
                [(9.2730359358, 35.0359520169), (9.5973133334, 34.7262022467), (9.5973133334, 34.044441446)],
                knots=[0, 0, 0, 1, 1, 1], degree=2))
            Line((9.5973133334, 34.044441446), (9.5973133334, 31.726247186))
        make_face(mode=Mode.SUBTRACT)
        with BuildLine():
            ThreePointArc((9.525, 0), (-0.4768479324, 9.5130563464), (-9.4772553384, -0.9525))
            ThreePointArc((-9.4772553384, -0.9525), (-6.2623833816, -7.1769199091), (0.3401785714, -9.5189234444))
            ThreePointArc((0.3401785714, -9.5189234444), (6.8544082857, -6.6138273378), (9.525, 0))
        make_face()
        Circle(F0_R, mode=Mode.SUBTRACT)
        with BuildLine():
            ThreePointArc((44.7334821429, 7.9324362036), (36.5125, 0), (44.7334821429, -7.9324362036))
            ThreePointArc((44.7334821429, -7.9324362036), (50.1620069047, -5.5115227815), (52.3875, 0))
            ThreePointArc((52.3875, 0), (50.1620069047, 5.5115227815), (44.7334821429, 7.9324362036))
        make_face()
        with Locations((44.45, 0)):
            Circle(F0_R, mode=Mode.SUBTRACT)
    extrude(amount=F1_DEPTH)


solid = f1.part
